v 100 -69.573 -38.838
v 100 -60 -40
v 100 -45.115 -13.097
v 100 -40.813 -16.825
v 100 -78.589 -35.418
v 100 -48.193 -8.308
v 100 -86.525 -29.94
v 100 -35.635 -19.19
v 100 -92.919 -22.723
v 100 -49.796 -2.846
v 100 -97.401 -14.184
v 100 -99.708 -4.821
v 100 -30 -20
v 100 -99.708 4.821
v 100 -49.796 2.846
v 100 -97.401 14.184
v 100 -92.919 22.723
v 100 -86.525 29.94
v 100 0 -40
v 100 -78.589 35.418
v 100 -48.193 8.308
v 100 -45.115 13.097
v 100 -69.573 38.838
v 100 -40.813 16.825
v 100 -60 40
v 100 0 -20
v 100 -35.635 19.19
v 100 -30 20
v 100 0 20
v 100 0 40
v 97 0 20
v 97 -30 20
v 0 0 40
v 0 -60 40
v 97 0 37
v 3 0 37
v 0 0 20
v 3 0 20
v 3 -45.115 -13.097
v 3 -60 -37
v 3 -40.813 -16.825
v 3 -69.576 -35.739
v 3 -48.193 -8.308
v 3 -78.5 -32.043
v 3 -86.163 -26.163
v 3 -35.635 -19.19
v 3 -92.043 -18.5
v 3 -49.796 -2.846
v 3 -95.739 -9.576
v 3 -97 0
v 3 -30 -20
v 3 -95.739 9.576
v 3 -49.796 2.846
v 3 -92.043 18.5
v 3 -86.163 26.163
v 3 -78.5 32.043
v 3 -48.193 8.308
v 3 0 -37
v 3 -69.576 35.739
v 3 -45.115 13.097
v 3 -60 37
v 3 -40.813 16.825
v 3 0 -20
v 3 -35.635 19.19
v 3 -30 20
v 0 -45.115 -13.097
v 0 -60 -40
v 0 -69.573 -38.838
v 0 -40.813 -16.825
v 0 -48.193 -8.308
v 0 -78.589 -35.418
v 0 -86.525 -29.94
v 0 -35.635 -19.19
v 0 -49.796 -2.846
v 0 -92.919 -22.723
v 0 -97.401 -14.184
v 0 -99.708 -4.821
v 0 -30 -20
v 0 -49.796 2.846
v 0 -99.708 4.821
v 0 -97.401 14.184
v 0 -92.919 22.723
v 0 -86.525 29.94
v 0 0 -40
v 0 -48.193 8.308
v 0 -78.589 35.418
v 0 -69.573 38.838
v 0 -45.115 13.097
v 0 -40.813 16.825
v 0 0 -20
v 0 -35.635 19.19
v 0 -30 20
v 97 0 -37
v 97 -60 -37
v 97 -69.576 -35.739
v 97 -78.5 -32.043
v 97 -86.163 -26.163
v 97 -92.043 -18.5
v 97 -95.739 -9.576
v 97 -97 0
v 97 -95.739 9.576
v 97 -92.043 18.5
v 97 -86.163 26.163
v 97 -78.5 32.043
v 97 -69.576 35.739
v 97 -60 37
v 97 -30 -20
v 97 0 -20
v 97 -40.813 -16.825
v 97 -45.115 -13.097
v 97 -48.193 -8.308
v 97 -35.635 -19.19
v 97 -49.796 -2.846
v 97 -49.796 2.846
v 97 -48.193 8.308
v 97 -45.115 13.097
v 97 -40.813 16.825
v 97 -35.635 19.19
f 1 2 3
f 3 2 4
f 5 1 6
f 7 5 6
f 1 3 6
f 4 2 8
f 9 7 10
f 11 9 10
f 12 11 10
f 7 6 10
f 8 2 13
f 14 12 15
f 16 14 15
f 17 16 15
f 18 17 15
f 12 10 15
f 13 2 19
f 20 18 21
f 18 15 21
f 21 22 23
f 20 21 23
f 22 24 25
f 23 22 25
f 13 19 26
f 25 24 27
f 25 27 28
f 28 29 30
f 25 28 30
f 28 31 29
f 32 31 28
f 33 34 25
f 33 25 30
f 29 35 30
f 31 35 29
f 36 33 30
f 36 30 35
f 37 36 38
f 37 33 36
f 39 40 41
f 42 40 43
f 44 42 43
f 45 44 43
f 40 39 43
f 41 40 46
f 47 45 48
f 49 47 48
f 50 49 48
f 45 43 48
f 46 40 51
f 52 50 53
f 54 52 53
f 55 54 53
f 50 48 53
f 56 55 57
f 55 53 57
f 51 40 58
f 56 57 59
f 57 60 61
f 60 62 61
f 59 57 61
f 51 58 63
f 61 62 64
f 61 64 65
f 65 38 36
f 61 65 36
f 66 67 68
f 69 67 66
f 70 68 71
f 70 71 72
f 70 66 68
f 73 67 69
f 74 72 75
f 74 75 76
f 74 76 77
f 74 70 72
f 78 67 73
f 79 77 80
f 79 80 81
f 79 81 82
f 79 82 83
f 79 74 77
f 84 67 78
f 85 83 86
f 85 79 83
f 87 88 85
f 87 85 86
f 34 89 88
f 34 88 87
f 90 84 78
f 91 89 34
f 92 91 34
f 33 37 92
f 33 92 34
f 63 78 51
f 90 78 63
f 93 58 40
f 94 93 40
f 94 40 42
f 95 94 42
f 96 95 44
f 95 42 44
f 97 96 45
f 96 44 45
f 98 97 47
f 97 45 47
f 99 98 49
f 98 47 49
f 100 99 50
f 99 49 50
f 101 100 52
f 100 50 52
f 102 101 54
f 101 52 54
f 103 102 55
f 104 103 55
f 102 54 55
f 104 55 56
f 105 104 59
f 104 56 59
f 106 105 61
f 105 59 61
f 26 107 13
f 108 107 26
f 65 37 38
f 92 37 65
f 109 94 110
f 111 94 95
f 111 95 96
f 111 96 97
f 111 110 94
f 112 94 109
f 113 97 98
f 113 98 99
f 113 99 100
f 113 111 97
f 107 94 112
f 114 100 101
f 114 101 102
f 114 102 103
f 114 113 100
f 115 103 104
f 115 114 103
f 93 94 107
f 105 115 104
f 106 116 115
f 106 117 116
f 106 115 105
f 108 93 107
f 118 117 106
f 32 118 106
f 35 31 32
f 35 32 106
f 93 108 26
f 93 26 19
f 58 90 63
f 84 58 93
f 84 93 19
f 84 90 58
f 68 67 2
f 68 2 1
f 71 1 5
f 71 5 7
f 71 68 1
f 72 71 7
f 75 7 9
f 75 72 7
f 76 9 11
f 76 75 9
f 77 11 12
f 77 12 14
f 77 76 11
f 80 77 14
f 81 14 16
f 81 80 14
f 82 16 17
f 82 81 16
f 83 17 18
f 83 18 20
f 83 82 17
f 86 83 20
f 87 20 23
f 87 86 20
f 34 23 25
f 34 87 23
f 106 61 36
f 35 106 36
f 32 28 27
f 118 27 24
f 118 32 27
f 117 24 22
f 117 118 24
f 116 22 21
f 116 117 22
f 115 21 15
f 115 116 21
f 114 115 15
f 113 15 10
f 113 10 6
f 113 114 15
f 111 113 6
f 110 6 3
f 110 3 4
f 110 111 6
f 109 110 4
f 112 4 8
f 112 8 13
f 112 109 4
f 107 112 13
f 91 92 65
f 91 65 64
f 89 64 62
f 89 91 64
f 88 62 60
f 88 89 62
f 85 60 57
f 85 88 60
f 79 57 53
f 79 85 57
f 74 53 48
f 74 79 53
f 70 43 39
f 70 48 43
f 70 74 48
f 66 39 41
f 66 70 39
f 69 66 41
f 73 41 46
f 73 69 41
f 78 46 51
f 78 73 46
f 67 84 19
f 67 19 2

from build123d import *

# Parameters (mm, degrees)
BOSS_EXTRUDE2_DEPTH = 100
SHELL1_T            = -3


with BuildPart() as part:
    # Sketch1 → Boss-Extrude2 (new body)
    with BuildSketch(Plane(origin=(0, 0, 0), x_dir=(0, 0, -1), z_dir=(1, 0, 0))):
        with BuildLine():
            Line((40, 0), (40, -60))
            ThreePointArc((40, -60), (0, -100), (-40, -60))
            Line((-40, -60), (-40, 0))
            Line((-40, 0), (-20, 0))
            Line((-20, 0), (-20, -30))
            ThreePointArc((-20, -30), (0, -50), (20, -30))
            Line((20, -30), (20, 0))
            Line((20, 0), (40, 0))
        make_face()
    extrude(amount=BOSS_EXTRUDE2_DEPTH)

    # Shell1
    shell1_openings = [part.faces().sort_by_distance(p)[0] for p in [
        (50, 0, -30),
        (50, -15, -20),
        (50, -50, 0),
        (50, -15, 20),
        (50, 0, 30),
    ]]
    offset(amount=SHELL1_T, openings=shell1_openings, kind=Kind.INTERSECTION)


solid = part.part
